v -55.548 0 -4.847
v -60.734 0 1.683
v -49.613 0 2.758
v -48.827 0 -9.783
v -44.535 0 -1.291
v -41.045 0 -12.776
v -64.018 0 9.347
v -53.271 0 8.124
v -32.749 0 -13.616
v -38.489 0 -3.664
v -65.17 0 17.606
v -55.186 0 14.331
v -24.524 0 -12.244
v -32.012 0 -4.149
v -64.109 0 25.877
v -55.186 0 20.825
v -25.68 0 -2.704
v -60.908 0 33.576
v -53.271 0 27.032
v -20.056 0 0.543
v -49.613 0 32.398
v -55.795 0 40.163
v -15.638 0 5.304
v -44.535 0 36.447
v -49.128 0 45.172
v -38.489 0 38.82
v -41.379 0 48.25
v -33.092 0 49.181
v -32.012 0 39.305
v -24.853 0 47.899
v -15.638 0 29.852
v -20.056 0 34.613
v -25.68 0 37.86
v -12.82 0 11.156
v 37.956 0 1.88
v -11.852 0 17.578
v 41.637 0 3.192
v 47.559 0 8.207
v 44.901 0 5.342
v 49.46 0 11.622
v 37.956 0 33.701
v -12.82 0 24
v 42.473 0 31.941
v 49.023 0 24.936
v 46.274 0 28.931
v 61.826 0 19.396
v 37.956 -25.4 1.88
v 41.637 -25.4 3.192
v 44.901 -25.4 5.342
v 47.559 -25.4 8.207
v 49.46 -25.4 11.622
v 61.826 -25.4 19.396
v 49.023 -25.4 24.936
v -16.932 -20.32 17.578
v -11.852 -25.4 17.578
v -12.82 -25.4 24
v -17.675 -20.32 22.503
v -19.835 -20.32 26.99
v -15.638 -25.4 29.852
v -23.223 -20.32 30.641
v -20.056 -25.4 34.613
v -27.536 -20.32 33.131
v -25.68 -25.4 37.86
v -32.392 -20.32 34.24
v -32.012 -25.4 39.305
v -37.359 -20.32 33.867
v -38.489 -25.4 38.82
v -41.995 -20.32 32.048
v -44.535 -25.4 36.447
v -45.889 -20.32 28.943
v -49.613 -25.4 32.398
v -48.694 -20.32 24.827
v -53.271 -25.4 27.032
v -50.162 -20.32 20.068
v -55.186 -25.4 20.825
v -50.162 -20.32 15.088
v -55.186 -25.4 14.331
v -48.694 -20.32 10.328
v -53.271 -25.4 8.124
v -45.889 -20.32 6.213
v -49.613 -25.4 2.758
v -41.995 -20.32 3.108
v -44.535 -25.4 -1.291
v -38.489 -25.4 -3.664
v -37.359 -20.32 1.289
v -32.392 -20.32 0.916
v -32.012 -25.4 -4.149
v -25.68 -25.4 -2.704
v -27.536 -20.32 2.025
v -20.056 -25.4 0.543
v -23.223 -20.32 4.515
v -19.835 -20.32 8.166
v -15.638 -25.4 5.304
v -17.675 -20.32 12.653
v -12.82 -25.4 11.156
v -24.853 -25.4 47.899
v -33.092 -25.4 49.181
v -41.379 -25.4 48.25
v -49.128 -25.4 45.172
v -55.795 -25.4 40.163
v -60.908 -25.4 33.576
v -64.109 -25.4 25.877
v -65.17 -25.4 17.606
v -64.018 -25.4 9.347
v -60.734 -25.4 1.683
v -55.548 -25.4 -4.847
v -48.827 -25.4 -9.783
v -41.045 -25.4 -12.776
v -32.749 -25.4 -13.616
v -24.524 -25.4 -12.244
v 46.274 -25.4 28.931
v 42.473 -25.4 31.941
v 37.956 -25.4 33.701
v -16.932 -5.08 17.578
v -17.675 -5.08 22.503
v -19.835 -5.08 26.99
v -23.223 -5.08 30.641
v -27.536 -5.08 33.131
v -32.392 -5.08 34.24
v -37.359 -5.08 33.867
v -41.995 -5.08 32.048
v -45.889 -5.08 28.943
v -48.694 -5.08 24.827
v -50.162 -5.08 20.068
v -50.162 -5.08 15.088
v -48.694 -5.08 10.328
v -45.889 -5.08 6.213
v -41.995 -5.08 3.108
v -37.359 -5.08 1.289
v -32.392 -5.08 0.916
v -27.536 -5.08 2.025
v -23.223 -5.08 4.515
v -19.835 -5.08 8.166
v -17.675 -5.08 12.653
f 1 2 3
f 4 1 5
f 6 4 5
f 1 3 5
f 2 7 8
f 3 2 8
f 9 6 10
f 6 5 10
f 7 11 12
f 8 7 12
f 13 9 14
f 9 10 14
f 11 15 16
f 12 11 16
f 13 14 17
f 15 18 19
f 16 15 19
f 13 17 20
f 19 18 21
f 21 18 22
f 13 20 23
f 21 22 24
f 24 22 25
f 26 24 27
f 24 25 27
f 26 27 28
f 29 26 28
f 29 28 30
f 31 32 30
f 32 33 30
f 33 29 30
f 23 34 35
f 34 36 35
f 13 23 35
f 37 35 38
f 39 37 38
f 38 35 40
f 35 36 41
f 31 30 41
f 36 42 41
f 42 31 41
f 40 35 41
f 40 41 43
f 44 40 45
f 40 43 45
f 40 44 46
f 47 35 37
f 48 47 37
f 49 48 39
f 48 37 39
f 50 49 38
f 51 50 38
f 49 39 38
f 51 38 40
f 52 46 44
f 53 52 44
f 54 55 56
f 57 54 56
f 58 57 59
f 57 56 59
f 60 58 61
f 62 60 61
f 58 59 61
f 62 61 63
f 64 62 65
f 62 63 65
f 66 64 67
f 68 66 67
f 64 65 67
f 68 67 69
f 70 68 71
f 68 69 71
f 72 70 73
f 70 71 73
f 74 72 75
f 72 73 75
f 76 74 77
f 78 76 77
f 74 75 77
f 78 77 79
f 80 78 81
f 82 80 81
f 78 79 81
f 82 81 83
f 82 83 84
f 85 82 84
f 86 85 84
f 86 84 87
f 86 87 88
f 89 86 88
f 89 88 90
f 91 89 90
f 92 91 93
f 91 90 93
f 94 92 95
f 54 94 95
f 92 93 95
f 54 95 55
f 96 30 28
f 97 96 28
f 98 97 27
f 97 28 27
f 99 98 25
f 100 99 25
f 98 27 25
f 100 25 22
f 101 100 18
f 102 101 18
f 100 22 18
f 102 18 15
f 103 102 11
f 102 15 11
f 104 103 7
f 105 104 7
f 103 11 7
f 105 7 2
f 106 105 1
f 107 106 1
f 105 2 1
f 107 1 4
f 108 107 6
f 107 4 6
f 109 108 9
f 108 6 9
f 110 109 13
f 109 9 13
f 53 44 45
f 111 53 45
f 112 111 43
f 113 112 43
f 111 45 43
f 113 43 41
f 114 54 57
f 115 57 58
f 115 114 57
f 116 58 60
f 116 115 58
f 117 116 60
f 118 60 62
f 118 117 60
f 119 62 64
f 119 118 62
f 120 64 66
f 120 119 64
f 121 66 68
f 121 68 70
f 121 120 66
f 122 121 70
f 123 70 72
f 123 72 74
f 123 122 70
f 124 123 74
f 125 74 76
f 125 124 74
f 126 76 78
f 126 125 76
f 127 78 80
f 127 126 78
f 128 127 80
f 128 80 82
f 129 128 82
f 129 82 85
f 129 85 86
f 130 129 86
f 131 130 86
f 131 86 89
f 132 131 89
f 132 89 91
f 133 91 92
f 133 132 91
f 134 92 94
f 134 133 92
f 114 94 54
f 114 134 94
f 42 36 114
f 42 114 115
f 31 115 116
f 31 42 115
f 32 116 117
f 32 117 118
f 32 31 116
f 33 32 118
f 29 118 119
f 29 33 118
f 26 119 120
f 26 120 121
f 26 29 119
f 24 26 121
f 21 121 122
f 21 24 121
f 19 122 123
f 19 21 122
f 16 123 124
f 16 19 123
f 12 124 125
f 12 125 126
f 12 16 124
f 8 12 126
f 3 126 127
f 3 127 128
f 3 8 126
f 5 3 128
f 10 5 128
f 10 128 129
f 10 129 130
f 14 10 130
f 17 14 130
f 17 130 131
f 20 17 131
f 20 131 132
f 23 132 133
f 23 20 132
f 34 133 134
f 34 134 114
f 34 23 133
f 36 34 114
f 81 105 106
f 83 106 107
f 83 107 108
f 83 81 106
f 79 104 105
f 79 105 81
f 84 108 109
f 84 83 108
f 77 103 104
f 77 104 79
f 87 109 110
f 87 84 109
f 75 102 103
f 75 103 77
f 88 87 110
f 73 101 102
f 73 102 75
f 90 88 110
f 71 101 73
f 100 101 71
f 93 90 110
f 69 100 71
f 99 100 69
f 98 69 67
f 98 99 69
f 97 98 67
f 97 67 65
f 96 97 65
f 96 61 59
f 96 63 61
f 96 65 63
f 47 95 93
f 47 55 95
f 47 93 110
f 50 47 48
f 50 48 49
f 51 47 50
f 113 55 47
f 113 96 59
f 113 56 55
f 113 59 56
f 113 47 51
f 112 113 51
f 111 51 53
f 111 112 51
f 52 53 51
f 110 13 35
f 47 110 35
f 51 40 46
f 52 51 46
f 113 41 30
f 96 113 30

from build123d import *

# Parameters (mm, degrees)
F0_R     = 16.708359
F1_DEPTH = 25.4
F2_SIZE  = 5.08
F3_SIZE  = 5.08


with BuildPart() as f1:
    # F0 (on Front) → F1 (new body)
    with BuildSketch(Plane.XZ):
        with BuildLine():
            ThreePointArc((-24.523889, -12.243737), (-8.494482, -0.883461), (-2.350032, 17.777823))
            ThreePointArc((-2.350032, 17.777823), (-8.596971, 36.577077), (-24.852983, 47.898664))
            ThreePointArc((-24.852983, 47.898664), (-65.170116, 17.605951), (-24.523889, -12.243737))
        make_face()
        with Locations((-33.640571, 17.577954)):
            Circle(F0_R, mode=Mode.SUBTRACT)
        with BuildLine():
            ThreePointArc((-24.852983, 47.898664), (-8.596971, 36.577077), (-2.350032, 17.777823))
            ThreePointArc((-2.350032, 17.777823), (-8.494482, -0.883461), (-24.523889, -12.243737))
            Line((-24.523889, -12.243737), (37.955624, 1.879685))
            ThreePointArc((37.955624, 1.879685), (18.047037, 17.790268), (37.955624, 33.70085))
            Line((37.955624, 33.70085), (-24.852983, 47.898664))
        make_face()
        with BuildLine():
            ThreePointArc((49.022596, 24.936072), (44.486406, 30.577711), (37.955624, 33.70085))
            ThreePointArc((37.955624, 33.70085), (18.047037, 17.790268), (37.955624, 1.879685))
            ThreePointArc((37.955624, 1.879685), (44.90086, 5.342284), (49.460027, 11.622401))
            ThreePointArc((49.460027, 11.622401), (50.365449, 14.64745), (50.671074, 17.790268))
            ThreePointArc((50.671074, 17.790268), (50.253612, 21.45701), (49.022596, 24.936072))
        make_face()
        with BuildLine():
            Line((61.825909, 19.396365), (49.022596, 24.936072))
            ThreePointArc((49.022596, 24.936072), (50.253612, 21.45701), (50.671074, 17.790268))
            ThreePointArc((50.671074, 17.790268), (50.365449, 14.64745), (49.460027, 11.622401))
            Line((49.460027, 11.622401), (61.825909, 19.396365))
        make_face()
    extrude(amount=F1_DEPTH)

    # F2
    f2_edges = [f1.edges().sort_by_distance(p)[0] for p in [
        (-50.34893, -25.4, 17.577954),
    ]]
    chamfer(f2_edges, length=F2_SIZE)

    # F3
    f3_edges = [f1.edges().sort_by_distance(p)[0] for p in [
        (-50.34893, 0, 17.577954),
    ]]
    chamfer(f3_edges, length=F3_SIZE)


solid = f1.part
